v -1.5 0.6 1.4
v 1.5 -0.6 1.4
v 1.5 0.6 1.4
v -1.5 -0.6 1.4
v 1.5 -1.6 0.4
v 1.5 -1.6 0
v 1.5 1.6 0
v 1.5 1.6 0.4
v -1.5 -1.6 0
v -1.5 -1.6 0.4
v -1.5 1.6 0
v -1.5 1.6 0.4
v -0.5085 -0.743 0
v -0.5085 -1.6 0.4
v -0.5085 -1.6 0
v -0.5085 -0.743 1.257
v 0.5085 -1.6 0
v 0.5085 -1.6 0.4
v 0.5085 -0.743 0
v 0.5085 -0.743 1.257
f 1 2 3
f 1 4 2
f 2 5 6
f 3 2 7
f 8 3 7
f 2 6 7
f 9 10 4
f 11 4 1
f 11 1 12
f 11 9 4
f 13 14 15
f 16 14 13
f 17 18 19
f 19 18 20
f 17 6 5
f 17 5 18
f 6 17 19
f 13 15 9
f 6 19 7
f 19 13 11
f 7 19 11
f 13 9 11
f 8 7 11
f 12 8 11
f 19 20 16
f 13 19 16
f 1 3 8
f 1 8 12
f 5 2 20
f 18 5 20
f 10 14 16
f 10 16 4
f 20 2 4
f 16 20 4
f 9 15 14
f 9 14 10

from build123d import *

# Parameters (mm, degrees)
SKETCH_W             = 3.2
SKETCH_H             = 3
PAD_DEPTH            = 1.4
CHAMFER_SIZE         = 1
SKETCH001_W          = 2.017963
SKETCH001_H          = 1.017
POCKET_DEPTH         = 5
BODY_PLACEMENT_ANGLE = 90


with BuildPart() as part:
    # Sketch → Pad (new body)
    with BuildSketch(Plane.XY):
        Rectangle(SKETCH_W, SKETCH_H)
    extrude(amount=PAD_DEPTH)

    # Chamfer
    chamfer_edges = [part.edges().sort_by_distance(p)[0] for p in [
        (-1.6, 0, 1.4),
        (1.6, 0, 1.4),
    ]]
    chamfer(chamfer_edges, length=CHAMFER_SIZE)

    # Sketch001 (on Face5 of Chamfer) → Pocket (cut)
    with BuildSketch(Plane.XY.offset(1.4)):
        with Locations((-1.75199, 0)):
            Rectangle(SKETCH001_W, SKETCH001_H)
    extrude(amount=-POCKET_DEPTH, mode=Mode.SUBTRACT)


with BuildPart() as part_1:
    # Body placement: moved
    add(part.part.rotate(Axis((0, 0, 0), (0, 0, 1)), BODY_PLACEMENT_ANGLE))


solid = part_1.part
